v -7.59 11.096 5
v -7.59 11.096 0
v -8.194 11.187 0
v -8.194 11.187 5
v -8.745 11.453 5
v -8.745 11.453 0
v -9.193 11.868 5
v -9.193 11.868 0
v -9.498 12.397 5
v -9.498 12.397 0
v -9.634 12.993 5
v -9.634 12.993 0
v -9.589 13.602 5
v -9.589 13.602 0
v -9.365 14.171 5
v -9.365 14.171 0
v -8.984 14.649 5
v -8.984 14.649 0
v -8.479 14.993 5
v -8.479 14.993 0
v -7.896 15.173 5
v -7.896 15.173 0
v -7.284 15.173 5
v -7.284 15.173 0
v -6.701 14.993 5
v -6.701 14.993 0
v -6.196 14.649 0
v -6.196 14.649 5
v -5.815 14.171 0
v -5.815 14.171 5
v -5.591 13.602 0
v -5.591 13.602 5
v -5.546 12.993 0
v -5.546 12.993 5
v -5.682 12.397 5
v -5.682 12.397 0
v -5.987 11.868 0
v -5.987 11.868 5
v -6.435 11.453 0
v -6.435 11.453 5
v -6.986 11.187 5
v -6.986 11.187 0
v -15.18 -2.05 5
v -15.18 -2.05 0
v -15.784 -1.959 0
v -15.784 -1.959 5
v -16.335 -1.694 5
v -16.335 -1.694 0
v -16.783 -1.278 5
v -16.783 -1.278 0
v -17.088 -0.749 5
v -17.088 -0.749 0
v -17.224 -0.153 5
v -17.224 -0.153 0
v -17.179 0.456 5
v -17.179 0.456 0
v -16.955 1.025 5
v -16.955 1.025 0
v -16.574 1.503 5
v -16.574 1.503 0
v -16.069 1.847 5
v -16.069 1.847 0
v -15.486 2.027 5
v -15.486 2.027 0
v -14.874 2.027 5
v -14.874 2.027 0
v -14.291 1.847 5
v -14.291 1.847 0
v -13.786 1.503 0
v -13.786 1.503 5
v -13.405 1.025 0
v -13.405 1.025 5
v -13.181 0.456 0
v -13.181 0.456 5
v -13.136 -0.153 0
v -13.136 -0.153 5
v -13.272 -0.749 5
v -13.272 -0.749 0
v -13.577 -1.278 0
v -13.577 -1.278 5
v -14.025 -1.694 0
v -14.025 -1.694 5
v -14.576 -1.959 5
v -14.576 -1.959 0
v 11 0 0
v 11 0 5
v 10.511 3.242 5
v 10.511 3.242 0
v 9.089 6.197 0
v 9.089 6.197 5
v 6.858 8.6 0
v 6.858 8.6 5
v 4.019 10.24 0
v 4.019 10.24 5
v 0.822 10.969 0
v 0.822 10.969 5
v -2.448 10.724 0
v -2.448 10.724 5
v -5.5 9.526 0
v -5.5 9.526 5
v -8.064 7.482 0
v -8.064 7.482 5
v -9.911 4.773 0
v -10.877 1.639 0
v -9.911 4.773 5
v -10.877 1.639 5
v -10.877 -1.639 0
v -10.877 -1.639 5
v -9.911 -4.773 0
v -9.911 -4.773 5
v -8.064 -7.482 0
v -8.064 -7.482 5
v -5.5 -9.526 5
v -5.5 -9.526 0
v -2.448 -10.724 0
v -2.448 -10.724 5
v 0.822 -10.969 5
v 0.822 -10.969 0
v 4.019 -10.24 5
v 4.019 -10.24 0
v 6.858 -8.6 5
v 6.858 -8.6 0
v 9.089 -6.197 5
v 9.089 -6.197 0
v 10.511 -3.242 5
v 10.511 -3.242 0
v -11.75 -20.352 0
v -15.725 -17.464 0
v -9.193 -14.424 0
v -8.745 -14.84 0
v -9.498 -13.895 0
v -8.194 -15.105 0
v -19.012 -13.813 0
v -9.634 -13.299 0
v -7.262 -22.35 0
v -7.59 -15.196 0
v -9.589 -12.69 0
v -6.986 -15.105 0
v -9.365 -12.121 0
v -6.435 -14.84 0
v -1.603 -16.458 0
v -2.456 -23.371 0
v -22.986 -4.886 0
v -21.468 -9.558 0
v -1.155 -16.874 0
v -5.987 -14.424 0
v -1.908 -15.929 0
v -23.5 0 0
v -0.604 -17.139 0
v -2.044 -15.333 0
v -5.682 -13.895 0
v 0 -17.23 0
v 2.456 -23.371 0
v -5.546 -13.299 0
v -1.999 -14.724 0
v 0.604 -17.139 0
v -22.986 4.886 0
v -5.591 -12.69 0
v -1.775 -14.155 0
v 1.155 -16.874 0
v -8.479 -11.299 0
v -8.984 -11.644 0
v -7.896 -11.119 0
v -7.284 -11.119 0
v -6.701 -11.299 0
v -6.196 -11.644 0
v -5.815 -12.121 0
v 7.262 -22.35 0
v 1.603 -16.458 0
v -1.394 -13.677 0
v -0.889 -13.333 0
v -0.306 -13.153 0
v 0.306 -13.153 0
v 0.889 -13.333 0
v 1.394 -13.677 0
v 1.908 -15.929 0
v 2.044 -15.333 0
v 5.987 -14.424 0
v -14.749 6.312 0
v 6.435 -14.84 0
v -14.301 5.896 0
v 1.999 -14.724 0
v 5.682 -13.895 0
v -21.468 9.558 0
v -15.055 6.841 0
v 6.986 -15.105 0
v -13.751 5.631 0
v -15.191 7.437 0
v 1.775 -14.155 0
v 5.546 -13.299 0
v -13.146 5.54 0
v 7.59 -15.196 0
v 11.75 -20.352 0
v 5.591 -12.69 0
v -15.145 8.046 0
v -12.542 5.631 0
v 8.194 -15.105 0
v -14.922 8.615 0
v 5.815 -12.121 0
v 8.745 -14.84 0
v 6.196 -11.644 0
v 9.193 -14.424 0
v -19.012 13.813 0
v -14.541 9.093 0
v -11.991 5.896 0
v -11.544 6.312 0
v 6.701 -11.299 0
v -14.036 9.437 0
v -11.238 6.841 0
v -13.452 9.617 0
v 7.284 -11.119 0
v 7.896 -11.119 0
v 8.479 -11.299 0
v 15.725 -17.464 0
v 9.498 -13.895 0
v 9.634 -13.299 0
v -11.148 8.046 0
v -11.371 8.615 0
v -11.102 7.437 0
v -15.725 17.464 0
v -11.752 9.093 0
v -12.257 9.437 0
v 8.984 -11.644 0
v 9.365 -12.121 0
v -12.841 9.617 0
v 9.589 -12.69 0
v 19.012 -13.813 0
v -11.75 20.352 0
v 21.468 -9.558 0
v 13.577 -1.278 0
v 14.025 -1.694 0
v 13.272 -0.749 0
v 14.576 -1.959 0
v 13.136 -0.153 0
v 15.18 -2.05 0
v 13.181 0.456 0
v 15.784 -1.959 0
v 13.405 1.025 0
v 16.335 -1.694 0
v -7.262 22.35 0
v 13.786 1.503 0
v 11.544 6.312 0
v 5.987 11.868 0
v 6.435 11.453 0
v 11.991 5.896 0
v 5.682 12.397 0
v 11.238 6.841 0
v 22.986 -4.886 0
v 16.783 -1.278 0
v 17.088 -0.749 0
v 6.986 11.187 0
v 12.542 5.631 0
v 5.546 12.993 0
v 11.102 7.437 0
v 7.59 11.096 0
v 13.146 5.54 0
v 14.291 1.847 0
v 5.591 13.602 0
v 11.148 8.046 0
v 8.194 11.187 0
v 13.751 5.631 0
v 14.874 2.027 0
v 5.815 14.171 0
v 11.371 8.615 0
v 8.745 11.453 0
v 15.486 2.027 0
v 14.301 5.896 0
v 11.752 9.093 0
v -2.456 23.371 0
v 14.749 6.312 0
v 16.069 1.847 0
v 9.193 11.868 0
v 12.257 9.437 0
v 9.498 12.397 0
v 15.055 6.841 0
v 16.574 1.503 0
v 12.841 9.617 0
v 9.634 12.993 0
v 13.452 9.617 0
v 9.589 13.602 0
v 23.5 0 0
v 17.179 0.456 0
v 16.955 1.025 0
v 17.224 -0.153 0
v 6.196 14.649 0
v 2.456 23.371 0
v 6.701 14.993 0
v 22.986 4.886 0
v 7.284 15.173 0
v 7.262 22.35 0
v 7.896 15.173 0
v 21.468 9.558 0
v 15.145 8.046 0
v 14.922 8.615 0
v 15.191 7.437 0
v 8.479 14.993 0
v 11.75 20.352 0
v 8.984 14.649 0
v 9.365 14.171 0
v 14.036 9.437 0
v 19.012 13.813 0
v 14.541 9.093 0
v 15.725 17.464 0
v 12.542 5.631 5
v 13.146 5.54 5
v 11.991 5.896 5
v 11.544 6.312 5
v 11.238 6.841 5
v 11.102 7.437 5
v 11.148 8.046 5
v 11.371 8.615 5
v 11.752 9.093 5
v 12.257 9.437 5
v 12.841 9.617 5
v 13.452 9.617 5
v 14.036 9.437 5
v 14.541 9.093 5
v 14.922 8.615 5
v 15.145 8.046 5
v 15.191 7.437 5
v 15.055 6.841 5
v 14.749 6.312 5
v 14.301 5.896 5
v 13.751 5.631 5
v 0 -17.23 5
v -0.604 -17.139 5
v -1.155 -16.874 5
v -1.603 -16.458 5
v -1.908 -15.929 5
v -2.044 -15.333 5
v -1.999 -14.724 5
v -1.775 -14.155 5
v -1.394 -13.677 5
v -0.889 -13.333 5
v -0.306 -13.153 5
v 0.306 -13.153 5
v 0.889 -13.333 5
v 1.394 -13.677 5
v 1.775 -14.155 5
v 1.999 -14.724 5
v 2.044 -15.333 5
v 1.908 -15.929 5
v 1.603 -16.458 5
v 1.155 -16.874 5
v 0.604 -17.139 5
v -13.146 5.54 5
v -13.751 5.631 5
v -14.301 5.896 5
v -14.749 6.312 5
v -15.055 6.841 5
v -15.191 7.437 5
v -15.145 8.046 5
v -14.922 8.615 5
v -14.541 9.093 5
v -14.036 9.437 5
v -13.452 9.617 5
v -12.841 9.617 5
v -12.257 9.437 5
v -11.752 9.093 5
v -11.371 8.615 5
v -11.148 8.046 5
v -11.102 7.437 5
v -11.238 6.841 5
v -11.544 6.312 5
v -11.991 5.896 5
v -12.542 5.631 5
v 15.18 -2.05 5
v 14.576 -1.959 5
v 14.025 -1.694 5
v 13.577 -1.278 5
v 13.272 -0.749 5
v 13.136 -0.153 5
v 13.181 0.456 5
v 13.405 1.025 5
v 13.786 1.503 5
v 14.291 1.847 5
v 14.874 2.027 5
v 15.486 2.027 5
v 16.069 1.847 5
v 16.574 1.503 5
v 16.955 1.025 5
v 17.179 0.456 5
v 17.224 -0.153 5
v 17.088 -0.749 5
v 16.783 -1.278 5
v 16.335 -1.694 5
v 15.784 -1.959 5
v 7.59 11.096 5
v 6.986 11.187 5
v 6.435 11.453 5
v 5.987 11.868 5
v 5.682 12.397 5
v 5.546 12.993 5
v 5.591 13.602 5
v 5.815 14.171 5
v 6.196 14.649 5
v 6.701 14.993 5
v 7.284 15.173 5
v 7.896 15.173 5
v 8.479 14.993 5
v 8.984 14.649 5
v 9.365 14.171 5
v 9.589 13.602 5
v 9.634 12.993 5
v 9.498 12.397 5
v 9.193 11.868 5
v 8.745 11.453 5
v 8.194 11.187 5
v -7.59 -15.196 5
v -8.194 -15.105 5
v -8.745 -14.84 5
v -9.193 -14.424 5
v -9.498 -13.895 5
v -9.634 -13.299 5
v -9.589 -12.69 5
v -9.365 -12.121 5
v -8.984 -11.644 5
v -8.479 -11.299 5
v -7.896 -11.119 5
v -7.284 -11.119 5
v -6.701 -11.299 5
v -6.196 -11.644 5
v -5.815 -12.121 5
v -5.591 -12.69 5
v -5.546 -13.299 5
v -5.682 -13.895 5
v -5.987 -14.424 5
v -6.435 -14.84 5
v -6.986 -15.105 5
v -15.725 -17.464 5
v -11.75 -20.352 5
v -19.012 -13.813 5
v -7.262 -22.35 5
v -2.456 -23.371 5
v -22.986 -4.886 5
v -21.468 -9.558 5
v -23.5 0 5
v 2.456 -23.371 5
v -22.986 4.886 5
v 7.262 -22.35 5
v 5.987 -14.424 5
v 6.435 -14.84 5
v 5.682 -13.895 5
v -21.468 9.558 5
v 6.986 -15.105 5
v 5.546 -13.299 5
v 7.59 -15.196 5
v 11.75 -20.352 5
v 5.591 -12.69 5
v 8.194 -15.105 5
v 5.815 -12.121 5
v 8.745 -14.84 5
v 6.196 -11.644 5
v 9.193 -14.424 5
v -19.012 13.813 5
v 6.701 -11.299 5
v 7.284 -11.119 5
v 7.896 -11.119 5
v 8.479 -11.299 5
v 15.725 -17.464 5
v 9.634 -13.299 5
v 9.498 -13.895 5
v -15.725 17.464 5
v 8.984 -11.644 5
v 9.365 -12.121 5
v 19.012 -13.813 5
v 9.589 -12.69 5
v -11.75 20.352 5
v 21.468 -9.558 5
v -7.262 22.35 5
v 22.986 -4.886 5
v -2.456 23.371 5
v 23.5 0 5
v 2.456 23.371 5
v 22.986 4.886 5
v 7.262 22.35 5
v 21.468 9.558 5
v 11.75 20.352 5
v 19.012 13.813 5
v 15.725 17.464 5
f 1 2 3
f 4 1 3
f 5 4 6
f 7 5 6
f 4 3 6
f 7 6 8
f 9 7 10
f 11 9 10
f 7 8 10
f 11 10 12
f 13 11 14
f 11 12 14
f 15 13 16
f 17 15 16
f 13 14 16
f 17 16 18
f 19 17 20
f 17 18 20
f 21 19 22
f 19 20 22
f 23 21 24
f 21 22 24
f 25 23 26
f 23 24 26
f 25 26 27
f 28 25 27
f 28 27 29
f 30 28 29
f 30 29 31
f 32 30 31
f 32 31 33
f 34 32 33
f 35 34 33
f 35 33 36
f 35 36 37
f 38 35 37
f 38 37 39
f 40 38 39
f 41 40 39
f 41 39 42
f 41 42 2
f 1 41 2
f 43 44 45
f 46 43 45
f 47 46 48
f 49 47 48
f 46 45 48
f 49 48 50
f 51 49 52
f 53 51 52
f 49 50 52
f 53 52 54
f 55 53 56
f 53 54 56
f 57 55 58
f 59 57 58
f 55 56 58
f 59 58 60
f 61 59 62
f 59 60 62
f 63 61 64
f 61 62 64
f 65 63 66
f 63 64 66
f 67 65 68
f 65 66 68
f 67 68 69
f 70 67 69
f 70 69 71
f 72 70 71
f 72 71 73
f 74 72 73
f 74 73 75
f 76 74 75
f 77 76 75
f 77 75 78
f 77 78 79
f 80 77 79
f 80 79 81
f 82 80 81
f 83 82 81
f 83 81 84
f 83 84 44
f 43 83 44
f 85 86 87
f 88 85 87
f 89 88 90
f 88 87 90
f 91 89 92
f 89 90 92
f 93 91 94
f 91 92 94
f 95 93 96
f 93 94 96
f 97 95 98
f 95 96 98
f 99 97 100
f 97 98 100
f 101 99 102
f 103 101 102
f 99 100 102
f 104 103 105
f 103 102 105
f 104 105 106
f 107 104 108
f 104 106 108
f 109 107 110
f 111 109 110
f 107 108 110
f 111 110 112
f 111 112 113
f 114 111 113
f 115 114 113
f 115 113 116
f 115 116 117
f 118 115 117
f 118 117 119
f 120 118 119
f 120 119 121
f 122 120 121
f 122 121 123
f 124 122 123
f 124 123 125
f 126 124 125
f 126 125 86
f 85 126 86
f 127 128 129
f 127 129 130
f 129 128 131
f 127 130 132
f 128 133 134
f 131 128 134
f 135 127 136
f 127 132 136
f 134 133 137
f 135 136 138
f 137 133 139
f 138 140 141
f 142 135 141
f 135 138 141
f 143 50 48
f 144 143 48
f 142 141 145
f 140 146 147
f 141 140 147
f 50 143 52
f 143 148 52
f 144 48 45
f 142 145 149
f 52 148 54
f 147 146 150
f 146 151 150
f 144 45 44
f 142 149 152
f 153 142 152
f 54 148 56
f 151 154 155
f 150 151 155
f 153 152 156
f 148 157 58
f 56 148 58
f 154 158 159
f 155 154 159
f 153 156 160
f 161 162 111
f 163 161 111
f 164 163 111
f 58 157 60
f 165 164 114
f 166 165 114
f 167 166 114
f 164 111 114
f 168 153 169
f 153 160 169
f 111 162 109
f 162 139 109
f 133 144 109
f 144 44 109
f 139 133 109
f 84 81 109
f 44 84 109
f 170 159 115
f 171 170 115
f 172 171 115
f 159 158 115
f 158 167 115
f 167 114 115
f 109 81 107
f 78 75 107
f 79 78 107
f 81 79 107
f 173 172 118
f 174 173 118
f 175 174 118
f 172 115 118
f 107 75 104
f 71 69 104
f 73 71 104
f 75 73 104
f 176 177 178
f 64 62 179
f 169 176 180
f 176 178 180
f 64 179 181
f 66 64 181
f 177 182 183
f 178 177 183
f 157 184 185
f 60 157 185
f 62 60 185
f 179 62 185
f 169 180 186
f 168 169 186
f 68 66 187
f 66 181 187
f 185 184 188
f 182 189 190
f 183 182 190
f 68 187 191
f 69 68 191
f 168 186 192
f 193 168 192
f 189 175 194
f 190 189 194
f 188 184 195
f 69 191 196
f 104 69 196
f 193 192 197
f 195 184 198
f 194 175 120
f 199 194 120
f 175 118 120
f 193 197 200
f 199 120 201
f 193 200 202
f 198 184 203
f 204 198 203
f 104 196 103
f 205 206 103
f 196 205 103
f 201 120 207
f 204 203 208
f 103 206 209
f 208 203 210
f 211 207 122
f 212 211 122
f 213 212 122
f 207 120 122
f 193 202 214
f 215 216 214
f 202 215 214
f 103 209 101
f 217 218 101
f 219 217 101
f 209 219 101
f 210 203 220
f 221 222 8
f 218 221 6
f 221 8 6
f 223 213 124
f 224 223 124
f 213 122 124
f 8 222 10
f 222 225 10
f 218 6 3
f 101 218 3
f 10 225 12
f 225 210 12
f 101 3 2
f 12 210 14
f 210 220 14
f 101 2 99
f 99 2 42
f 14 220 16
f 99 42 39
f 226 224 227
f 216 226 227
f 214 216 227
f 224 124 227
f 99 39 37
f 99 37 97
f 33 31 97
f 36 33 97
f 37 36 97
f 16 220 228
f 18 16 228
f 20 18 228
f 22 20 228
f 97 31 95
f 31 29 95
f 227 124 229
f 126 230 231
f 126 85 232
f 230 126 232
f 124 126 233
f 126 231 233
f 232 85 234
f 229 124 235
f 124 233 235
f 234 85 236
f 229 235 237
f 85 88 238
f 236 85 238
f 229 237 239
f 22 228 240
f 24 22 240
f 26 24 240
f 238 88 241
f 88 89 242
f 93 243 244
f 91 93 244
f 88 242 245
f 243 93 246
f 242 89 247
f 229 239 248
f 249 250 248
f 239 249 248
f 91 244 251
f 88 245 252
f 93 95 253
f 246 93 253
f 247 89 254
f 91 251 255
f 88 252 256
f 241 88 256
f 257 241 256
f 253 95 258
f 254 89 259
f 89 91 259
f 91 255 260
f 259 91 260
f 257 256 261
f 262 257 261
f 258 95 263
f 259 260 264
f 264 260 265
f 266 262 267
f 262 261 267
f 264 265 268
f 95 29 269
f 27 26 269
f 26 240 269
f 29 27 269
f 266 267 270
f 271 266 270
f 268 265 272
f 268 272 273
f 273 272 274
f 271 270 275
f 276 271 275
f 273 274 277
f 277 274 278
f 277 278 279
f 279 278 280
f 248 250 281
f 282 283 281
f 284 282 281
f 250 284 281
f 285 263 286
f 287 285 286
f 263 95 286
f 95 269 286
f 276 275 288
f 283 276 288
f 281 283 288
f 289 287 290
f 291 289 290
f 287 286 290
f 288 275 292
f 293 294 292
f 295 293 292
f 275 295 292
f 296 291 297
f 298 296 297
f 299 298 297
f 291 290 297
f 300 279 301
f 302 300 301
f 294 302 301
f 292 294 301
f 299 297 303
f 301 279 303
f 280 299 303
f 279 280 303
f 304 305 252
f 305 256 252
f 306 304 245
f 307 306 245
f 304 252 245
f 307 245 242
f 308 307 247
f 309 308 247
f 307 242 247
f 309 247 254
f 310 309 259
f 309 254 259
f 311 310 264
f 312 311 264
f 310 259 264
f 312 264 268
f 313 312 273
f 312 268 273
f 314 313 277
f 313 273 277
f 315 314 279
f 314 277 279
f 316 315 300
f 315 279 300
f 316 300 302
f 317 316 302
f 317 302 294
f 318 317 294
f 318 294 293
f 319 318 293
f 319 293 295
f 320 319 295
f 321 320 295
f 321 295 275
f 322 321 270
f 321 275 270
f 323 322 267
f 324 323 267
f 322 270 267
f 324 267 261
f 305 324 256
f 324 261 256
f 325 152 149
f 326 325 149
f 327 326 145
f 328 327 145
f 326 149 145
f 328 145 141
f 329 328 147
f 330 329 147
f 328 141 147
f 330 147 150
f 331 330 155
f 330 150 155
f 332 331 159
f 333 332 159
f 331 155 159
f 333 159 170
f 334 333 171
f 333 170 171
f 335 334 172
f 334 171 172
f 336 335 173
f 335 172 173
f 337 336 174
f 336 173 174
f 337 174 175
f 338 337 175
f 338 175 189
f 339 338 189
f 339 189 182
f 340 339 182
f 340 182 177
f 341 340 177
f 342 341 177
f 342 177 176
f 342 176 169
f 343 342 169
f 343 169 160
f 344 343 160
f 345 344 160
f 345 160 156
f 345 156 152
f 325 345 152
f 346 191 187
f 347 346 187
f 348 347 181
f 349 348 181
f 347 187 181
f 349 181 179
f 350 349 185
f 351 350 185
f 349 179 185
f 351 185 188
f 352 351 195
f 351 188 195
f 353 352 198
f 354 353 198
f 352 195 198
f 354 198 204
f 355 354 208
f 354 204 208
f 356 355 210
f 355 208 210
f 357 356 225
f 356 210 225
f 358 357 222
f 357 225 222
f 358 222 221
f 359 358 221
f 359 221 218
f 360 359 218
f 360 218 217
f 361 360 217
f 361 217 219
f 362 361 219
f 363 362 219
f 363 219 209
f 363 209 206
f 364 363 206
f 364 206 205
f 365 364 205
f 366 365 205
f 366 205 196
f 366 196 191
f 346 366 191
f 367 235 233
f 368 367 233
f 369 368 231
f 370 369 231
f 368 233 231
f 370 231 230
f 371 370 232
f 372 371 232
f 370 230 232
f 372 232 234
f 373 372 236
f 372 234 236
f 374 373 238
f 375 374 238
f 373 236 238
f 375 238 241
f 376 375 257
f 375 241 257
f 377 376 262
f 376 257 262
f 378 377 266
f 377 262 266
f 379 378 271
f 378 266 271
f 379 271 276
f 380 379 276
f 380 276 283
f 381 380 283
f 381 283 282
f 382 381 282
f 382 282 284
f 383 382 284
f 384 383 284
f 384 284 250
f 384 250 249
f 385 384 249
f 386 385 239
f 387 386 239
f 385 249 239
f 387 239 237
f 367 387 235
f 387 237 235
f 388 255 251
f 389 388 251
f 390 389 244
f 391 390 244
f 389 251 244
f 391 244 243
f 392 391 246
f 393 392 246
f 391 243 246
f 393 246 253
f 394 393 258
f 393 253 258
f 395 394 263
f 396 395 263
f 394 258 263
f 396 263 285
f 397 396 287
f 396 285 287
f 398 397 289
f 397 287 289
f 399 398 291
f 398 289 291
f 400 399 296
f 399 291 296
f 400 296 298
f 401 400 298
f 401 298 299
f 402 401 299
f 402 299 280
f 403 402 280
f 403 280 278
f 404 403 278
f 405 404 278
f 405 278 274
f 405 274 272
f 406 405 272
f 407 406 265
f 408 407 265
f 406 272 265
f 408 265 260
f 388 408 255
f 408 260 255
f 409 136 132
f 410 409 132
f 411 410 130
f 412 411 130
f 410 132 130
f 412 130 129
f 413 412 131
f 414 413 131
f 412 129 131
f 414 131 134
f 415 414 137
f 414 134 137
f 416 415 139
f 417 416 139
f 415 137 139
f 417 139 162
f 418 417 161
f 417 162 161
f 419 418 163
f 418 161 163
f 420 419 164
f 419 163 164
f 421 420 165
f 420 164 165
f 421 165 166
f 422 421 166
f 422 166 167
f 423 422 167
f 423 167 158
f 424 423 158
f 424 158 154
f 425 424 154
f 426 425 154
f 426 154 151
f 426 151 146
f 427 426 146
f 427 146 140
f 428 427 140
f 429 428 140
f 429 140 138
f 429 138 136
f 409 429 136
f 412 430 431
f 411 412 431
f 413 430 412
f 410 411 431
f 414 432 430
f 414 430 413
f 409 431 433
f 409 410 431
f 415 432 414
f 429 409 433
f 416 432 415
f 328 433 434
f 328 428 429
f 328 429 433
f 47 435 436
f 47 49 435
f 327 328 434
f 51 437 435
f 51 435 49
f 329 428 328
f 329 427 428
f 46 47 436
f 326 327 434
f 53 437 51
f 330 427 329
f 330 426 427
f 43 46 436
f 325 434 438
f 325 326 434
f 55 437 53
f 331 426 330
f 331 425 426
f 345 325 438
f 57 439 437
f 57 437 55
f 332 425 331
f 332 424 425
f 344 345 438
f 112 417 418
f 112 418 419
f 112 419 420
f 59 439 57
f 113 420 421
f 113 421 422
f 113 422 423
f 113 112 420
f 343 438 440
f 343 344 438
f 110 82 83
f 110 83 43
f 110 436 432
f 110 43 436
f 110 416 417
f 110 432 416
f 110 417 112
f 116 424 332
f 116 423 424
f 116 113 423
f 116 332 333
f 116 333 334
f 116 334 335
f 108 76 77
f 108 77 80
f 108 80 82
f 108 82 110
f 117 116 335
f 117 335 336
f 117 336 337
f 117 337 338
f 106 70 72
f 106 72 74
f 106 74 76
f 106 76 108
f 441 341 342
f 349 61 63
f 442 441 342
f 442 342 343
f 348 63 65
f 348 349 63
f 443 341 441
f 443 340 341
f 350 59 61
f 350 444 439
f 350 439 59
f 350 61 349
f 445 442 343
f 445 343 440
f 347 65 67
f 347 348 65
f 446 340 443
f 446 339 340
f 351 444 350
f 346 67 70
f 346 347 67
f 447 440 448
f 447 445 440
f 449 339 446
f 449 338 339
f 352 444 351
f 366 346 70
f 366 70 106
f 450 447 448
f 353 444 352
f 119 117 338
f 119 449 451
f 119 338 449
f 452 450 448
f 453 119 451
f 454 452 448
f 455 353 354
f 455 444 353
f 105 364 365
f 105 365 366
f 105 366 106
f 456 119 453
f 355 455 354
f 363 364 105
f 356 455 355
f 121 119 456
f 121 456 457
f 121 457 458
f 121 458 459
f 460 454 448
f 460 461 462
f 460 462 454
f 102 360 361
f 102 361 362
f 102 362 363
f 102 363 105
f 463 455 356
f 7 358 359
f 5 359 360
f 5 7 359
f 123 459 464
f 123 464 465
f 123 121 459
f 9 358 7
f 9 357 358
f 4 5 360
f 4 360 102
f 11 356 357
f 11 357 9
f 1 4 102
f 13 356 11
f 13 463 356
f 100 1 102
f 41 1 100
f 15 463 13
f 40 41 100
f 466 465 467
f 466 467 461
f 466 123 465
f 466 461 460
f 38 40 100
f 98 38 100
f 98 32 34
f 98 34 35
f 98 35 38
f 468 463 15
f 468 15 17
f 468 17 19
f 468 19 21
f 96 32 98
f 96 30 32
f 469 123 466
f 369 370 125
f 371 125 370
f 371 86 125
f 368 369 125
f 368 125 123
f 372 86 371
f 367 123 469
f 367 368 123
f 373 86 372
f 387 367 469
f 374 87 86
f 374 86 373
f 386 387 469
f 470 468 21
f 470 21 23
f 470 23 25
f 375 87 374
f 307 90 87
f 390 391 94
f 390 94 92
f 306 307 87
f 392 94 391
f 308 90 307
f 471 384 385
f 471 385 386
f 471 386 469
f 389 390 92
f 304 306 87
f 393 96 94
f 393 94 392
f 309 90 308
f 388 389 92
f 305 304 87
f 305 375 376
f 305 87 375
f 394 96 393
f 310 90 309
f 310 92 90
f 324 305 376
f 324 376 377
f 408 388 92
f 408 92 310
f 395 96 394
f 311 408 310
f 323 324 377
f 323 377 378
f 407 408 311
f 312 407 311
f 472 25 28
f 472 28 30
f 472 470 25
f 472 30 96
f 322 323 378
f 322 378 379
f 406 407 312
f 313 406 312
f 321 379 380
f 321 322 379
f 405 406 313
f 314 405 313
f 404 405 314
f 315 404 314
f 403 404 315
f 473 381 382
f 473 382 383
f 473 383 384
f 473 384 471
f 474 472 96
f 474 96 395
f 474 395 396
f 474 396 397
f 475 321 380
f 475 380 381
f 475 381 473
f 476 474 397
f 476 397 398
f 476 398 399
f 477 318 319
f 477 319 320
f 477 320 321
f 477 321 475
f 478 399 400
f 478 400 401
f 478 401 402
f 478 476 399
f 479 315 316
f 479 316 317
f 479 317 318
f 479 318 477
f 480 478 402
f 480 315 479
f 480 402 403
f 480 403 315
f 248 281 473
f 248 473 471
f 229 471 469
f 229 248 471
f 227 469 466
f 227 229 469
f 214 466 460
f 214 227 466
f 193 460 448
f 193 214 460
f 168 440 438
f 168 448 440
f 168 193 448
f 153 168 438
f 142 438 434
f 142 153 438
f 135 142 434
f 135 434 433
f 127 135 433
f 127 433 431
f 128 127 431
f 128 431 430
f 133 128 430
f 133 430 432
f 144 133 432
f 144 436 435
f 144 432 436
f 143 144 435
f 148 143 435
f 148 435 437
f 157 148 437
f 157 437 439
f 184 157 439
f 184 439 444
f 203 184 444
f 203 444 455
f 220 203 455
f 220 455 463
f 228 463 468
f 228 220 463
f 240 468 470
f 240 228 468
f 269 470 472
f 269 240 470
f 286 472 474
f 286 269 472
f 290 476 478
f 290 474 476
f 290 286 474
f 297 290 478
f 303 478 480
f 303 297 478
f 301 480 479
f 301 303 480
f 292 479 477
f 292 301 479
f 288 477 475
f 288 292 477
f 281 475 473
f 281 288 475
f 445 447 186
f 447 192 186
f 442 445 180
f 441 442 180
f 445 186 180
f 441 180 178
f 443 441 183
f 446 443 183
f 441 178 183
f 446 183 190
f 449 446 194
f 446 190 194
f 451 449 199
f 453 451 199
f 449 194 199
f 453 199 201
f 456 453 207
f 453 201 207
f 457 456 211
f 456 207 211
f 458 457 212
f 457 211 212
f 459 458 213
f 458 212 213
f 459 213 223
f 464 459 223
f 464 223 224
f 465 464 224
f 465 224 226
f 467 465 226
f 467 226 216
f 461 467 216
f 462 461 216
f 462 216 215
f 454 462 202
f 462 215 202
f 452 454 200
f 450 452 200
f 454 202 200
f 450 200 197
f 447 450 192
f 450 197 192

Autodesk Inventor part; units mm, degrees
ref_plane "YZ Plane" through (0, 0, 0) normal (1, 0, 0) x (0, 1, 0)
ref_plane "XZ Plane" through (0, 0, 0) normal (0, 1, 0) x (-1, 0, 0)
ref_plane "XY Plane" through (0, 0, 0) normal (0, 0, 1) x (1, 0, 0)
sketch "スケッチ1" plane through (0, 0, 0) normal (0, 0, 1) x (1, 0, 0)
  circle A0 centre (0, 0) radius 23.5
  dimension "d0" = 47
extrude "押し出し1" add sketch "スケッチ1" along normal blind 5
sketch "スケッチ2" plane through (0, 0, 5) normal (0, 0, 1) x (1, 0, 0)
  line L0 (0, 0) -> (0, -15.18)
  circle A0 centre (0, 0) radius 15.18
  line L1 (0, 0) -> (7.59, -13.1463)
  point P0 (13.1463, 7.59)
  point P1 (-13.1463, 7.59)
  point P2 (15.18, 0)
  point P3 (7.59, 13.1463)
  point P4 (-7.59, 13.1463)
  point P5 (-15.18, 0)
  point P6 (-7.59, -13.1463)
  dimension "d3" = 30.36
  dimension "d6" = 360
  dimension "d8" = 30
  dimension "d11" = 360
hole "穴1" at (0, -15.18, 5) at (13.1463, 7.59, 5) at (-13.1463, 7.59, 5) at (7.59, -13.1463, 5) at (15.18, 0, 5) at (7.59, 13.1463, 5) at (-7.59, 13.1463, 5) at (-15.18, 0, 5) at (-7.59, -13.1463, 5) direction (0, 0, -1) diameter 4.1 end through all
sketch "スケッチ3" plane through (0, 0, 5) normal (0, 0, 1) x (1, 0, 0)
  circle A0 centre (0, 0) radius 11
  dimension "d20" = 22
extrude "押し出し2" cut sketch "スケッチ3" against normal blind 5
properties part number "base_plate2" material "アルミニウム 6061"
